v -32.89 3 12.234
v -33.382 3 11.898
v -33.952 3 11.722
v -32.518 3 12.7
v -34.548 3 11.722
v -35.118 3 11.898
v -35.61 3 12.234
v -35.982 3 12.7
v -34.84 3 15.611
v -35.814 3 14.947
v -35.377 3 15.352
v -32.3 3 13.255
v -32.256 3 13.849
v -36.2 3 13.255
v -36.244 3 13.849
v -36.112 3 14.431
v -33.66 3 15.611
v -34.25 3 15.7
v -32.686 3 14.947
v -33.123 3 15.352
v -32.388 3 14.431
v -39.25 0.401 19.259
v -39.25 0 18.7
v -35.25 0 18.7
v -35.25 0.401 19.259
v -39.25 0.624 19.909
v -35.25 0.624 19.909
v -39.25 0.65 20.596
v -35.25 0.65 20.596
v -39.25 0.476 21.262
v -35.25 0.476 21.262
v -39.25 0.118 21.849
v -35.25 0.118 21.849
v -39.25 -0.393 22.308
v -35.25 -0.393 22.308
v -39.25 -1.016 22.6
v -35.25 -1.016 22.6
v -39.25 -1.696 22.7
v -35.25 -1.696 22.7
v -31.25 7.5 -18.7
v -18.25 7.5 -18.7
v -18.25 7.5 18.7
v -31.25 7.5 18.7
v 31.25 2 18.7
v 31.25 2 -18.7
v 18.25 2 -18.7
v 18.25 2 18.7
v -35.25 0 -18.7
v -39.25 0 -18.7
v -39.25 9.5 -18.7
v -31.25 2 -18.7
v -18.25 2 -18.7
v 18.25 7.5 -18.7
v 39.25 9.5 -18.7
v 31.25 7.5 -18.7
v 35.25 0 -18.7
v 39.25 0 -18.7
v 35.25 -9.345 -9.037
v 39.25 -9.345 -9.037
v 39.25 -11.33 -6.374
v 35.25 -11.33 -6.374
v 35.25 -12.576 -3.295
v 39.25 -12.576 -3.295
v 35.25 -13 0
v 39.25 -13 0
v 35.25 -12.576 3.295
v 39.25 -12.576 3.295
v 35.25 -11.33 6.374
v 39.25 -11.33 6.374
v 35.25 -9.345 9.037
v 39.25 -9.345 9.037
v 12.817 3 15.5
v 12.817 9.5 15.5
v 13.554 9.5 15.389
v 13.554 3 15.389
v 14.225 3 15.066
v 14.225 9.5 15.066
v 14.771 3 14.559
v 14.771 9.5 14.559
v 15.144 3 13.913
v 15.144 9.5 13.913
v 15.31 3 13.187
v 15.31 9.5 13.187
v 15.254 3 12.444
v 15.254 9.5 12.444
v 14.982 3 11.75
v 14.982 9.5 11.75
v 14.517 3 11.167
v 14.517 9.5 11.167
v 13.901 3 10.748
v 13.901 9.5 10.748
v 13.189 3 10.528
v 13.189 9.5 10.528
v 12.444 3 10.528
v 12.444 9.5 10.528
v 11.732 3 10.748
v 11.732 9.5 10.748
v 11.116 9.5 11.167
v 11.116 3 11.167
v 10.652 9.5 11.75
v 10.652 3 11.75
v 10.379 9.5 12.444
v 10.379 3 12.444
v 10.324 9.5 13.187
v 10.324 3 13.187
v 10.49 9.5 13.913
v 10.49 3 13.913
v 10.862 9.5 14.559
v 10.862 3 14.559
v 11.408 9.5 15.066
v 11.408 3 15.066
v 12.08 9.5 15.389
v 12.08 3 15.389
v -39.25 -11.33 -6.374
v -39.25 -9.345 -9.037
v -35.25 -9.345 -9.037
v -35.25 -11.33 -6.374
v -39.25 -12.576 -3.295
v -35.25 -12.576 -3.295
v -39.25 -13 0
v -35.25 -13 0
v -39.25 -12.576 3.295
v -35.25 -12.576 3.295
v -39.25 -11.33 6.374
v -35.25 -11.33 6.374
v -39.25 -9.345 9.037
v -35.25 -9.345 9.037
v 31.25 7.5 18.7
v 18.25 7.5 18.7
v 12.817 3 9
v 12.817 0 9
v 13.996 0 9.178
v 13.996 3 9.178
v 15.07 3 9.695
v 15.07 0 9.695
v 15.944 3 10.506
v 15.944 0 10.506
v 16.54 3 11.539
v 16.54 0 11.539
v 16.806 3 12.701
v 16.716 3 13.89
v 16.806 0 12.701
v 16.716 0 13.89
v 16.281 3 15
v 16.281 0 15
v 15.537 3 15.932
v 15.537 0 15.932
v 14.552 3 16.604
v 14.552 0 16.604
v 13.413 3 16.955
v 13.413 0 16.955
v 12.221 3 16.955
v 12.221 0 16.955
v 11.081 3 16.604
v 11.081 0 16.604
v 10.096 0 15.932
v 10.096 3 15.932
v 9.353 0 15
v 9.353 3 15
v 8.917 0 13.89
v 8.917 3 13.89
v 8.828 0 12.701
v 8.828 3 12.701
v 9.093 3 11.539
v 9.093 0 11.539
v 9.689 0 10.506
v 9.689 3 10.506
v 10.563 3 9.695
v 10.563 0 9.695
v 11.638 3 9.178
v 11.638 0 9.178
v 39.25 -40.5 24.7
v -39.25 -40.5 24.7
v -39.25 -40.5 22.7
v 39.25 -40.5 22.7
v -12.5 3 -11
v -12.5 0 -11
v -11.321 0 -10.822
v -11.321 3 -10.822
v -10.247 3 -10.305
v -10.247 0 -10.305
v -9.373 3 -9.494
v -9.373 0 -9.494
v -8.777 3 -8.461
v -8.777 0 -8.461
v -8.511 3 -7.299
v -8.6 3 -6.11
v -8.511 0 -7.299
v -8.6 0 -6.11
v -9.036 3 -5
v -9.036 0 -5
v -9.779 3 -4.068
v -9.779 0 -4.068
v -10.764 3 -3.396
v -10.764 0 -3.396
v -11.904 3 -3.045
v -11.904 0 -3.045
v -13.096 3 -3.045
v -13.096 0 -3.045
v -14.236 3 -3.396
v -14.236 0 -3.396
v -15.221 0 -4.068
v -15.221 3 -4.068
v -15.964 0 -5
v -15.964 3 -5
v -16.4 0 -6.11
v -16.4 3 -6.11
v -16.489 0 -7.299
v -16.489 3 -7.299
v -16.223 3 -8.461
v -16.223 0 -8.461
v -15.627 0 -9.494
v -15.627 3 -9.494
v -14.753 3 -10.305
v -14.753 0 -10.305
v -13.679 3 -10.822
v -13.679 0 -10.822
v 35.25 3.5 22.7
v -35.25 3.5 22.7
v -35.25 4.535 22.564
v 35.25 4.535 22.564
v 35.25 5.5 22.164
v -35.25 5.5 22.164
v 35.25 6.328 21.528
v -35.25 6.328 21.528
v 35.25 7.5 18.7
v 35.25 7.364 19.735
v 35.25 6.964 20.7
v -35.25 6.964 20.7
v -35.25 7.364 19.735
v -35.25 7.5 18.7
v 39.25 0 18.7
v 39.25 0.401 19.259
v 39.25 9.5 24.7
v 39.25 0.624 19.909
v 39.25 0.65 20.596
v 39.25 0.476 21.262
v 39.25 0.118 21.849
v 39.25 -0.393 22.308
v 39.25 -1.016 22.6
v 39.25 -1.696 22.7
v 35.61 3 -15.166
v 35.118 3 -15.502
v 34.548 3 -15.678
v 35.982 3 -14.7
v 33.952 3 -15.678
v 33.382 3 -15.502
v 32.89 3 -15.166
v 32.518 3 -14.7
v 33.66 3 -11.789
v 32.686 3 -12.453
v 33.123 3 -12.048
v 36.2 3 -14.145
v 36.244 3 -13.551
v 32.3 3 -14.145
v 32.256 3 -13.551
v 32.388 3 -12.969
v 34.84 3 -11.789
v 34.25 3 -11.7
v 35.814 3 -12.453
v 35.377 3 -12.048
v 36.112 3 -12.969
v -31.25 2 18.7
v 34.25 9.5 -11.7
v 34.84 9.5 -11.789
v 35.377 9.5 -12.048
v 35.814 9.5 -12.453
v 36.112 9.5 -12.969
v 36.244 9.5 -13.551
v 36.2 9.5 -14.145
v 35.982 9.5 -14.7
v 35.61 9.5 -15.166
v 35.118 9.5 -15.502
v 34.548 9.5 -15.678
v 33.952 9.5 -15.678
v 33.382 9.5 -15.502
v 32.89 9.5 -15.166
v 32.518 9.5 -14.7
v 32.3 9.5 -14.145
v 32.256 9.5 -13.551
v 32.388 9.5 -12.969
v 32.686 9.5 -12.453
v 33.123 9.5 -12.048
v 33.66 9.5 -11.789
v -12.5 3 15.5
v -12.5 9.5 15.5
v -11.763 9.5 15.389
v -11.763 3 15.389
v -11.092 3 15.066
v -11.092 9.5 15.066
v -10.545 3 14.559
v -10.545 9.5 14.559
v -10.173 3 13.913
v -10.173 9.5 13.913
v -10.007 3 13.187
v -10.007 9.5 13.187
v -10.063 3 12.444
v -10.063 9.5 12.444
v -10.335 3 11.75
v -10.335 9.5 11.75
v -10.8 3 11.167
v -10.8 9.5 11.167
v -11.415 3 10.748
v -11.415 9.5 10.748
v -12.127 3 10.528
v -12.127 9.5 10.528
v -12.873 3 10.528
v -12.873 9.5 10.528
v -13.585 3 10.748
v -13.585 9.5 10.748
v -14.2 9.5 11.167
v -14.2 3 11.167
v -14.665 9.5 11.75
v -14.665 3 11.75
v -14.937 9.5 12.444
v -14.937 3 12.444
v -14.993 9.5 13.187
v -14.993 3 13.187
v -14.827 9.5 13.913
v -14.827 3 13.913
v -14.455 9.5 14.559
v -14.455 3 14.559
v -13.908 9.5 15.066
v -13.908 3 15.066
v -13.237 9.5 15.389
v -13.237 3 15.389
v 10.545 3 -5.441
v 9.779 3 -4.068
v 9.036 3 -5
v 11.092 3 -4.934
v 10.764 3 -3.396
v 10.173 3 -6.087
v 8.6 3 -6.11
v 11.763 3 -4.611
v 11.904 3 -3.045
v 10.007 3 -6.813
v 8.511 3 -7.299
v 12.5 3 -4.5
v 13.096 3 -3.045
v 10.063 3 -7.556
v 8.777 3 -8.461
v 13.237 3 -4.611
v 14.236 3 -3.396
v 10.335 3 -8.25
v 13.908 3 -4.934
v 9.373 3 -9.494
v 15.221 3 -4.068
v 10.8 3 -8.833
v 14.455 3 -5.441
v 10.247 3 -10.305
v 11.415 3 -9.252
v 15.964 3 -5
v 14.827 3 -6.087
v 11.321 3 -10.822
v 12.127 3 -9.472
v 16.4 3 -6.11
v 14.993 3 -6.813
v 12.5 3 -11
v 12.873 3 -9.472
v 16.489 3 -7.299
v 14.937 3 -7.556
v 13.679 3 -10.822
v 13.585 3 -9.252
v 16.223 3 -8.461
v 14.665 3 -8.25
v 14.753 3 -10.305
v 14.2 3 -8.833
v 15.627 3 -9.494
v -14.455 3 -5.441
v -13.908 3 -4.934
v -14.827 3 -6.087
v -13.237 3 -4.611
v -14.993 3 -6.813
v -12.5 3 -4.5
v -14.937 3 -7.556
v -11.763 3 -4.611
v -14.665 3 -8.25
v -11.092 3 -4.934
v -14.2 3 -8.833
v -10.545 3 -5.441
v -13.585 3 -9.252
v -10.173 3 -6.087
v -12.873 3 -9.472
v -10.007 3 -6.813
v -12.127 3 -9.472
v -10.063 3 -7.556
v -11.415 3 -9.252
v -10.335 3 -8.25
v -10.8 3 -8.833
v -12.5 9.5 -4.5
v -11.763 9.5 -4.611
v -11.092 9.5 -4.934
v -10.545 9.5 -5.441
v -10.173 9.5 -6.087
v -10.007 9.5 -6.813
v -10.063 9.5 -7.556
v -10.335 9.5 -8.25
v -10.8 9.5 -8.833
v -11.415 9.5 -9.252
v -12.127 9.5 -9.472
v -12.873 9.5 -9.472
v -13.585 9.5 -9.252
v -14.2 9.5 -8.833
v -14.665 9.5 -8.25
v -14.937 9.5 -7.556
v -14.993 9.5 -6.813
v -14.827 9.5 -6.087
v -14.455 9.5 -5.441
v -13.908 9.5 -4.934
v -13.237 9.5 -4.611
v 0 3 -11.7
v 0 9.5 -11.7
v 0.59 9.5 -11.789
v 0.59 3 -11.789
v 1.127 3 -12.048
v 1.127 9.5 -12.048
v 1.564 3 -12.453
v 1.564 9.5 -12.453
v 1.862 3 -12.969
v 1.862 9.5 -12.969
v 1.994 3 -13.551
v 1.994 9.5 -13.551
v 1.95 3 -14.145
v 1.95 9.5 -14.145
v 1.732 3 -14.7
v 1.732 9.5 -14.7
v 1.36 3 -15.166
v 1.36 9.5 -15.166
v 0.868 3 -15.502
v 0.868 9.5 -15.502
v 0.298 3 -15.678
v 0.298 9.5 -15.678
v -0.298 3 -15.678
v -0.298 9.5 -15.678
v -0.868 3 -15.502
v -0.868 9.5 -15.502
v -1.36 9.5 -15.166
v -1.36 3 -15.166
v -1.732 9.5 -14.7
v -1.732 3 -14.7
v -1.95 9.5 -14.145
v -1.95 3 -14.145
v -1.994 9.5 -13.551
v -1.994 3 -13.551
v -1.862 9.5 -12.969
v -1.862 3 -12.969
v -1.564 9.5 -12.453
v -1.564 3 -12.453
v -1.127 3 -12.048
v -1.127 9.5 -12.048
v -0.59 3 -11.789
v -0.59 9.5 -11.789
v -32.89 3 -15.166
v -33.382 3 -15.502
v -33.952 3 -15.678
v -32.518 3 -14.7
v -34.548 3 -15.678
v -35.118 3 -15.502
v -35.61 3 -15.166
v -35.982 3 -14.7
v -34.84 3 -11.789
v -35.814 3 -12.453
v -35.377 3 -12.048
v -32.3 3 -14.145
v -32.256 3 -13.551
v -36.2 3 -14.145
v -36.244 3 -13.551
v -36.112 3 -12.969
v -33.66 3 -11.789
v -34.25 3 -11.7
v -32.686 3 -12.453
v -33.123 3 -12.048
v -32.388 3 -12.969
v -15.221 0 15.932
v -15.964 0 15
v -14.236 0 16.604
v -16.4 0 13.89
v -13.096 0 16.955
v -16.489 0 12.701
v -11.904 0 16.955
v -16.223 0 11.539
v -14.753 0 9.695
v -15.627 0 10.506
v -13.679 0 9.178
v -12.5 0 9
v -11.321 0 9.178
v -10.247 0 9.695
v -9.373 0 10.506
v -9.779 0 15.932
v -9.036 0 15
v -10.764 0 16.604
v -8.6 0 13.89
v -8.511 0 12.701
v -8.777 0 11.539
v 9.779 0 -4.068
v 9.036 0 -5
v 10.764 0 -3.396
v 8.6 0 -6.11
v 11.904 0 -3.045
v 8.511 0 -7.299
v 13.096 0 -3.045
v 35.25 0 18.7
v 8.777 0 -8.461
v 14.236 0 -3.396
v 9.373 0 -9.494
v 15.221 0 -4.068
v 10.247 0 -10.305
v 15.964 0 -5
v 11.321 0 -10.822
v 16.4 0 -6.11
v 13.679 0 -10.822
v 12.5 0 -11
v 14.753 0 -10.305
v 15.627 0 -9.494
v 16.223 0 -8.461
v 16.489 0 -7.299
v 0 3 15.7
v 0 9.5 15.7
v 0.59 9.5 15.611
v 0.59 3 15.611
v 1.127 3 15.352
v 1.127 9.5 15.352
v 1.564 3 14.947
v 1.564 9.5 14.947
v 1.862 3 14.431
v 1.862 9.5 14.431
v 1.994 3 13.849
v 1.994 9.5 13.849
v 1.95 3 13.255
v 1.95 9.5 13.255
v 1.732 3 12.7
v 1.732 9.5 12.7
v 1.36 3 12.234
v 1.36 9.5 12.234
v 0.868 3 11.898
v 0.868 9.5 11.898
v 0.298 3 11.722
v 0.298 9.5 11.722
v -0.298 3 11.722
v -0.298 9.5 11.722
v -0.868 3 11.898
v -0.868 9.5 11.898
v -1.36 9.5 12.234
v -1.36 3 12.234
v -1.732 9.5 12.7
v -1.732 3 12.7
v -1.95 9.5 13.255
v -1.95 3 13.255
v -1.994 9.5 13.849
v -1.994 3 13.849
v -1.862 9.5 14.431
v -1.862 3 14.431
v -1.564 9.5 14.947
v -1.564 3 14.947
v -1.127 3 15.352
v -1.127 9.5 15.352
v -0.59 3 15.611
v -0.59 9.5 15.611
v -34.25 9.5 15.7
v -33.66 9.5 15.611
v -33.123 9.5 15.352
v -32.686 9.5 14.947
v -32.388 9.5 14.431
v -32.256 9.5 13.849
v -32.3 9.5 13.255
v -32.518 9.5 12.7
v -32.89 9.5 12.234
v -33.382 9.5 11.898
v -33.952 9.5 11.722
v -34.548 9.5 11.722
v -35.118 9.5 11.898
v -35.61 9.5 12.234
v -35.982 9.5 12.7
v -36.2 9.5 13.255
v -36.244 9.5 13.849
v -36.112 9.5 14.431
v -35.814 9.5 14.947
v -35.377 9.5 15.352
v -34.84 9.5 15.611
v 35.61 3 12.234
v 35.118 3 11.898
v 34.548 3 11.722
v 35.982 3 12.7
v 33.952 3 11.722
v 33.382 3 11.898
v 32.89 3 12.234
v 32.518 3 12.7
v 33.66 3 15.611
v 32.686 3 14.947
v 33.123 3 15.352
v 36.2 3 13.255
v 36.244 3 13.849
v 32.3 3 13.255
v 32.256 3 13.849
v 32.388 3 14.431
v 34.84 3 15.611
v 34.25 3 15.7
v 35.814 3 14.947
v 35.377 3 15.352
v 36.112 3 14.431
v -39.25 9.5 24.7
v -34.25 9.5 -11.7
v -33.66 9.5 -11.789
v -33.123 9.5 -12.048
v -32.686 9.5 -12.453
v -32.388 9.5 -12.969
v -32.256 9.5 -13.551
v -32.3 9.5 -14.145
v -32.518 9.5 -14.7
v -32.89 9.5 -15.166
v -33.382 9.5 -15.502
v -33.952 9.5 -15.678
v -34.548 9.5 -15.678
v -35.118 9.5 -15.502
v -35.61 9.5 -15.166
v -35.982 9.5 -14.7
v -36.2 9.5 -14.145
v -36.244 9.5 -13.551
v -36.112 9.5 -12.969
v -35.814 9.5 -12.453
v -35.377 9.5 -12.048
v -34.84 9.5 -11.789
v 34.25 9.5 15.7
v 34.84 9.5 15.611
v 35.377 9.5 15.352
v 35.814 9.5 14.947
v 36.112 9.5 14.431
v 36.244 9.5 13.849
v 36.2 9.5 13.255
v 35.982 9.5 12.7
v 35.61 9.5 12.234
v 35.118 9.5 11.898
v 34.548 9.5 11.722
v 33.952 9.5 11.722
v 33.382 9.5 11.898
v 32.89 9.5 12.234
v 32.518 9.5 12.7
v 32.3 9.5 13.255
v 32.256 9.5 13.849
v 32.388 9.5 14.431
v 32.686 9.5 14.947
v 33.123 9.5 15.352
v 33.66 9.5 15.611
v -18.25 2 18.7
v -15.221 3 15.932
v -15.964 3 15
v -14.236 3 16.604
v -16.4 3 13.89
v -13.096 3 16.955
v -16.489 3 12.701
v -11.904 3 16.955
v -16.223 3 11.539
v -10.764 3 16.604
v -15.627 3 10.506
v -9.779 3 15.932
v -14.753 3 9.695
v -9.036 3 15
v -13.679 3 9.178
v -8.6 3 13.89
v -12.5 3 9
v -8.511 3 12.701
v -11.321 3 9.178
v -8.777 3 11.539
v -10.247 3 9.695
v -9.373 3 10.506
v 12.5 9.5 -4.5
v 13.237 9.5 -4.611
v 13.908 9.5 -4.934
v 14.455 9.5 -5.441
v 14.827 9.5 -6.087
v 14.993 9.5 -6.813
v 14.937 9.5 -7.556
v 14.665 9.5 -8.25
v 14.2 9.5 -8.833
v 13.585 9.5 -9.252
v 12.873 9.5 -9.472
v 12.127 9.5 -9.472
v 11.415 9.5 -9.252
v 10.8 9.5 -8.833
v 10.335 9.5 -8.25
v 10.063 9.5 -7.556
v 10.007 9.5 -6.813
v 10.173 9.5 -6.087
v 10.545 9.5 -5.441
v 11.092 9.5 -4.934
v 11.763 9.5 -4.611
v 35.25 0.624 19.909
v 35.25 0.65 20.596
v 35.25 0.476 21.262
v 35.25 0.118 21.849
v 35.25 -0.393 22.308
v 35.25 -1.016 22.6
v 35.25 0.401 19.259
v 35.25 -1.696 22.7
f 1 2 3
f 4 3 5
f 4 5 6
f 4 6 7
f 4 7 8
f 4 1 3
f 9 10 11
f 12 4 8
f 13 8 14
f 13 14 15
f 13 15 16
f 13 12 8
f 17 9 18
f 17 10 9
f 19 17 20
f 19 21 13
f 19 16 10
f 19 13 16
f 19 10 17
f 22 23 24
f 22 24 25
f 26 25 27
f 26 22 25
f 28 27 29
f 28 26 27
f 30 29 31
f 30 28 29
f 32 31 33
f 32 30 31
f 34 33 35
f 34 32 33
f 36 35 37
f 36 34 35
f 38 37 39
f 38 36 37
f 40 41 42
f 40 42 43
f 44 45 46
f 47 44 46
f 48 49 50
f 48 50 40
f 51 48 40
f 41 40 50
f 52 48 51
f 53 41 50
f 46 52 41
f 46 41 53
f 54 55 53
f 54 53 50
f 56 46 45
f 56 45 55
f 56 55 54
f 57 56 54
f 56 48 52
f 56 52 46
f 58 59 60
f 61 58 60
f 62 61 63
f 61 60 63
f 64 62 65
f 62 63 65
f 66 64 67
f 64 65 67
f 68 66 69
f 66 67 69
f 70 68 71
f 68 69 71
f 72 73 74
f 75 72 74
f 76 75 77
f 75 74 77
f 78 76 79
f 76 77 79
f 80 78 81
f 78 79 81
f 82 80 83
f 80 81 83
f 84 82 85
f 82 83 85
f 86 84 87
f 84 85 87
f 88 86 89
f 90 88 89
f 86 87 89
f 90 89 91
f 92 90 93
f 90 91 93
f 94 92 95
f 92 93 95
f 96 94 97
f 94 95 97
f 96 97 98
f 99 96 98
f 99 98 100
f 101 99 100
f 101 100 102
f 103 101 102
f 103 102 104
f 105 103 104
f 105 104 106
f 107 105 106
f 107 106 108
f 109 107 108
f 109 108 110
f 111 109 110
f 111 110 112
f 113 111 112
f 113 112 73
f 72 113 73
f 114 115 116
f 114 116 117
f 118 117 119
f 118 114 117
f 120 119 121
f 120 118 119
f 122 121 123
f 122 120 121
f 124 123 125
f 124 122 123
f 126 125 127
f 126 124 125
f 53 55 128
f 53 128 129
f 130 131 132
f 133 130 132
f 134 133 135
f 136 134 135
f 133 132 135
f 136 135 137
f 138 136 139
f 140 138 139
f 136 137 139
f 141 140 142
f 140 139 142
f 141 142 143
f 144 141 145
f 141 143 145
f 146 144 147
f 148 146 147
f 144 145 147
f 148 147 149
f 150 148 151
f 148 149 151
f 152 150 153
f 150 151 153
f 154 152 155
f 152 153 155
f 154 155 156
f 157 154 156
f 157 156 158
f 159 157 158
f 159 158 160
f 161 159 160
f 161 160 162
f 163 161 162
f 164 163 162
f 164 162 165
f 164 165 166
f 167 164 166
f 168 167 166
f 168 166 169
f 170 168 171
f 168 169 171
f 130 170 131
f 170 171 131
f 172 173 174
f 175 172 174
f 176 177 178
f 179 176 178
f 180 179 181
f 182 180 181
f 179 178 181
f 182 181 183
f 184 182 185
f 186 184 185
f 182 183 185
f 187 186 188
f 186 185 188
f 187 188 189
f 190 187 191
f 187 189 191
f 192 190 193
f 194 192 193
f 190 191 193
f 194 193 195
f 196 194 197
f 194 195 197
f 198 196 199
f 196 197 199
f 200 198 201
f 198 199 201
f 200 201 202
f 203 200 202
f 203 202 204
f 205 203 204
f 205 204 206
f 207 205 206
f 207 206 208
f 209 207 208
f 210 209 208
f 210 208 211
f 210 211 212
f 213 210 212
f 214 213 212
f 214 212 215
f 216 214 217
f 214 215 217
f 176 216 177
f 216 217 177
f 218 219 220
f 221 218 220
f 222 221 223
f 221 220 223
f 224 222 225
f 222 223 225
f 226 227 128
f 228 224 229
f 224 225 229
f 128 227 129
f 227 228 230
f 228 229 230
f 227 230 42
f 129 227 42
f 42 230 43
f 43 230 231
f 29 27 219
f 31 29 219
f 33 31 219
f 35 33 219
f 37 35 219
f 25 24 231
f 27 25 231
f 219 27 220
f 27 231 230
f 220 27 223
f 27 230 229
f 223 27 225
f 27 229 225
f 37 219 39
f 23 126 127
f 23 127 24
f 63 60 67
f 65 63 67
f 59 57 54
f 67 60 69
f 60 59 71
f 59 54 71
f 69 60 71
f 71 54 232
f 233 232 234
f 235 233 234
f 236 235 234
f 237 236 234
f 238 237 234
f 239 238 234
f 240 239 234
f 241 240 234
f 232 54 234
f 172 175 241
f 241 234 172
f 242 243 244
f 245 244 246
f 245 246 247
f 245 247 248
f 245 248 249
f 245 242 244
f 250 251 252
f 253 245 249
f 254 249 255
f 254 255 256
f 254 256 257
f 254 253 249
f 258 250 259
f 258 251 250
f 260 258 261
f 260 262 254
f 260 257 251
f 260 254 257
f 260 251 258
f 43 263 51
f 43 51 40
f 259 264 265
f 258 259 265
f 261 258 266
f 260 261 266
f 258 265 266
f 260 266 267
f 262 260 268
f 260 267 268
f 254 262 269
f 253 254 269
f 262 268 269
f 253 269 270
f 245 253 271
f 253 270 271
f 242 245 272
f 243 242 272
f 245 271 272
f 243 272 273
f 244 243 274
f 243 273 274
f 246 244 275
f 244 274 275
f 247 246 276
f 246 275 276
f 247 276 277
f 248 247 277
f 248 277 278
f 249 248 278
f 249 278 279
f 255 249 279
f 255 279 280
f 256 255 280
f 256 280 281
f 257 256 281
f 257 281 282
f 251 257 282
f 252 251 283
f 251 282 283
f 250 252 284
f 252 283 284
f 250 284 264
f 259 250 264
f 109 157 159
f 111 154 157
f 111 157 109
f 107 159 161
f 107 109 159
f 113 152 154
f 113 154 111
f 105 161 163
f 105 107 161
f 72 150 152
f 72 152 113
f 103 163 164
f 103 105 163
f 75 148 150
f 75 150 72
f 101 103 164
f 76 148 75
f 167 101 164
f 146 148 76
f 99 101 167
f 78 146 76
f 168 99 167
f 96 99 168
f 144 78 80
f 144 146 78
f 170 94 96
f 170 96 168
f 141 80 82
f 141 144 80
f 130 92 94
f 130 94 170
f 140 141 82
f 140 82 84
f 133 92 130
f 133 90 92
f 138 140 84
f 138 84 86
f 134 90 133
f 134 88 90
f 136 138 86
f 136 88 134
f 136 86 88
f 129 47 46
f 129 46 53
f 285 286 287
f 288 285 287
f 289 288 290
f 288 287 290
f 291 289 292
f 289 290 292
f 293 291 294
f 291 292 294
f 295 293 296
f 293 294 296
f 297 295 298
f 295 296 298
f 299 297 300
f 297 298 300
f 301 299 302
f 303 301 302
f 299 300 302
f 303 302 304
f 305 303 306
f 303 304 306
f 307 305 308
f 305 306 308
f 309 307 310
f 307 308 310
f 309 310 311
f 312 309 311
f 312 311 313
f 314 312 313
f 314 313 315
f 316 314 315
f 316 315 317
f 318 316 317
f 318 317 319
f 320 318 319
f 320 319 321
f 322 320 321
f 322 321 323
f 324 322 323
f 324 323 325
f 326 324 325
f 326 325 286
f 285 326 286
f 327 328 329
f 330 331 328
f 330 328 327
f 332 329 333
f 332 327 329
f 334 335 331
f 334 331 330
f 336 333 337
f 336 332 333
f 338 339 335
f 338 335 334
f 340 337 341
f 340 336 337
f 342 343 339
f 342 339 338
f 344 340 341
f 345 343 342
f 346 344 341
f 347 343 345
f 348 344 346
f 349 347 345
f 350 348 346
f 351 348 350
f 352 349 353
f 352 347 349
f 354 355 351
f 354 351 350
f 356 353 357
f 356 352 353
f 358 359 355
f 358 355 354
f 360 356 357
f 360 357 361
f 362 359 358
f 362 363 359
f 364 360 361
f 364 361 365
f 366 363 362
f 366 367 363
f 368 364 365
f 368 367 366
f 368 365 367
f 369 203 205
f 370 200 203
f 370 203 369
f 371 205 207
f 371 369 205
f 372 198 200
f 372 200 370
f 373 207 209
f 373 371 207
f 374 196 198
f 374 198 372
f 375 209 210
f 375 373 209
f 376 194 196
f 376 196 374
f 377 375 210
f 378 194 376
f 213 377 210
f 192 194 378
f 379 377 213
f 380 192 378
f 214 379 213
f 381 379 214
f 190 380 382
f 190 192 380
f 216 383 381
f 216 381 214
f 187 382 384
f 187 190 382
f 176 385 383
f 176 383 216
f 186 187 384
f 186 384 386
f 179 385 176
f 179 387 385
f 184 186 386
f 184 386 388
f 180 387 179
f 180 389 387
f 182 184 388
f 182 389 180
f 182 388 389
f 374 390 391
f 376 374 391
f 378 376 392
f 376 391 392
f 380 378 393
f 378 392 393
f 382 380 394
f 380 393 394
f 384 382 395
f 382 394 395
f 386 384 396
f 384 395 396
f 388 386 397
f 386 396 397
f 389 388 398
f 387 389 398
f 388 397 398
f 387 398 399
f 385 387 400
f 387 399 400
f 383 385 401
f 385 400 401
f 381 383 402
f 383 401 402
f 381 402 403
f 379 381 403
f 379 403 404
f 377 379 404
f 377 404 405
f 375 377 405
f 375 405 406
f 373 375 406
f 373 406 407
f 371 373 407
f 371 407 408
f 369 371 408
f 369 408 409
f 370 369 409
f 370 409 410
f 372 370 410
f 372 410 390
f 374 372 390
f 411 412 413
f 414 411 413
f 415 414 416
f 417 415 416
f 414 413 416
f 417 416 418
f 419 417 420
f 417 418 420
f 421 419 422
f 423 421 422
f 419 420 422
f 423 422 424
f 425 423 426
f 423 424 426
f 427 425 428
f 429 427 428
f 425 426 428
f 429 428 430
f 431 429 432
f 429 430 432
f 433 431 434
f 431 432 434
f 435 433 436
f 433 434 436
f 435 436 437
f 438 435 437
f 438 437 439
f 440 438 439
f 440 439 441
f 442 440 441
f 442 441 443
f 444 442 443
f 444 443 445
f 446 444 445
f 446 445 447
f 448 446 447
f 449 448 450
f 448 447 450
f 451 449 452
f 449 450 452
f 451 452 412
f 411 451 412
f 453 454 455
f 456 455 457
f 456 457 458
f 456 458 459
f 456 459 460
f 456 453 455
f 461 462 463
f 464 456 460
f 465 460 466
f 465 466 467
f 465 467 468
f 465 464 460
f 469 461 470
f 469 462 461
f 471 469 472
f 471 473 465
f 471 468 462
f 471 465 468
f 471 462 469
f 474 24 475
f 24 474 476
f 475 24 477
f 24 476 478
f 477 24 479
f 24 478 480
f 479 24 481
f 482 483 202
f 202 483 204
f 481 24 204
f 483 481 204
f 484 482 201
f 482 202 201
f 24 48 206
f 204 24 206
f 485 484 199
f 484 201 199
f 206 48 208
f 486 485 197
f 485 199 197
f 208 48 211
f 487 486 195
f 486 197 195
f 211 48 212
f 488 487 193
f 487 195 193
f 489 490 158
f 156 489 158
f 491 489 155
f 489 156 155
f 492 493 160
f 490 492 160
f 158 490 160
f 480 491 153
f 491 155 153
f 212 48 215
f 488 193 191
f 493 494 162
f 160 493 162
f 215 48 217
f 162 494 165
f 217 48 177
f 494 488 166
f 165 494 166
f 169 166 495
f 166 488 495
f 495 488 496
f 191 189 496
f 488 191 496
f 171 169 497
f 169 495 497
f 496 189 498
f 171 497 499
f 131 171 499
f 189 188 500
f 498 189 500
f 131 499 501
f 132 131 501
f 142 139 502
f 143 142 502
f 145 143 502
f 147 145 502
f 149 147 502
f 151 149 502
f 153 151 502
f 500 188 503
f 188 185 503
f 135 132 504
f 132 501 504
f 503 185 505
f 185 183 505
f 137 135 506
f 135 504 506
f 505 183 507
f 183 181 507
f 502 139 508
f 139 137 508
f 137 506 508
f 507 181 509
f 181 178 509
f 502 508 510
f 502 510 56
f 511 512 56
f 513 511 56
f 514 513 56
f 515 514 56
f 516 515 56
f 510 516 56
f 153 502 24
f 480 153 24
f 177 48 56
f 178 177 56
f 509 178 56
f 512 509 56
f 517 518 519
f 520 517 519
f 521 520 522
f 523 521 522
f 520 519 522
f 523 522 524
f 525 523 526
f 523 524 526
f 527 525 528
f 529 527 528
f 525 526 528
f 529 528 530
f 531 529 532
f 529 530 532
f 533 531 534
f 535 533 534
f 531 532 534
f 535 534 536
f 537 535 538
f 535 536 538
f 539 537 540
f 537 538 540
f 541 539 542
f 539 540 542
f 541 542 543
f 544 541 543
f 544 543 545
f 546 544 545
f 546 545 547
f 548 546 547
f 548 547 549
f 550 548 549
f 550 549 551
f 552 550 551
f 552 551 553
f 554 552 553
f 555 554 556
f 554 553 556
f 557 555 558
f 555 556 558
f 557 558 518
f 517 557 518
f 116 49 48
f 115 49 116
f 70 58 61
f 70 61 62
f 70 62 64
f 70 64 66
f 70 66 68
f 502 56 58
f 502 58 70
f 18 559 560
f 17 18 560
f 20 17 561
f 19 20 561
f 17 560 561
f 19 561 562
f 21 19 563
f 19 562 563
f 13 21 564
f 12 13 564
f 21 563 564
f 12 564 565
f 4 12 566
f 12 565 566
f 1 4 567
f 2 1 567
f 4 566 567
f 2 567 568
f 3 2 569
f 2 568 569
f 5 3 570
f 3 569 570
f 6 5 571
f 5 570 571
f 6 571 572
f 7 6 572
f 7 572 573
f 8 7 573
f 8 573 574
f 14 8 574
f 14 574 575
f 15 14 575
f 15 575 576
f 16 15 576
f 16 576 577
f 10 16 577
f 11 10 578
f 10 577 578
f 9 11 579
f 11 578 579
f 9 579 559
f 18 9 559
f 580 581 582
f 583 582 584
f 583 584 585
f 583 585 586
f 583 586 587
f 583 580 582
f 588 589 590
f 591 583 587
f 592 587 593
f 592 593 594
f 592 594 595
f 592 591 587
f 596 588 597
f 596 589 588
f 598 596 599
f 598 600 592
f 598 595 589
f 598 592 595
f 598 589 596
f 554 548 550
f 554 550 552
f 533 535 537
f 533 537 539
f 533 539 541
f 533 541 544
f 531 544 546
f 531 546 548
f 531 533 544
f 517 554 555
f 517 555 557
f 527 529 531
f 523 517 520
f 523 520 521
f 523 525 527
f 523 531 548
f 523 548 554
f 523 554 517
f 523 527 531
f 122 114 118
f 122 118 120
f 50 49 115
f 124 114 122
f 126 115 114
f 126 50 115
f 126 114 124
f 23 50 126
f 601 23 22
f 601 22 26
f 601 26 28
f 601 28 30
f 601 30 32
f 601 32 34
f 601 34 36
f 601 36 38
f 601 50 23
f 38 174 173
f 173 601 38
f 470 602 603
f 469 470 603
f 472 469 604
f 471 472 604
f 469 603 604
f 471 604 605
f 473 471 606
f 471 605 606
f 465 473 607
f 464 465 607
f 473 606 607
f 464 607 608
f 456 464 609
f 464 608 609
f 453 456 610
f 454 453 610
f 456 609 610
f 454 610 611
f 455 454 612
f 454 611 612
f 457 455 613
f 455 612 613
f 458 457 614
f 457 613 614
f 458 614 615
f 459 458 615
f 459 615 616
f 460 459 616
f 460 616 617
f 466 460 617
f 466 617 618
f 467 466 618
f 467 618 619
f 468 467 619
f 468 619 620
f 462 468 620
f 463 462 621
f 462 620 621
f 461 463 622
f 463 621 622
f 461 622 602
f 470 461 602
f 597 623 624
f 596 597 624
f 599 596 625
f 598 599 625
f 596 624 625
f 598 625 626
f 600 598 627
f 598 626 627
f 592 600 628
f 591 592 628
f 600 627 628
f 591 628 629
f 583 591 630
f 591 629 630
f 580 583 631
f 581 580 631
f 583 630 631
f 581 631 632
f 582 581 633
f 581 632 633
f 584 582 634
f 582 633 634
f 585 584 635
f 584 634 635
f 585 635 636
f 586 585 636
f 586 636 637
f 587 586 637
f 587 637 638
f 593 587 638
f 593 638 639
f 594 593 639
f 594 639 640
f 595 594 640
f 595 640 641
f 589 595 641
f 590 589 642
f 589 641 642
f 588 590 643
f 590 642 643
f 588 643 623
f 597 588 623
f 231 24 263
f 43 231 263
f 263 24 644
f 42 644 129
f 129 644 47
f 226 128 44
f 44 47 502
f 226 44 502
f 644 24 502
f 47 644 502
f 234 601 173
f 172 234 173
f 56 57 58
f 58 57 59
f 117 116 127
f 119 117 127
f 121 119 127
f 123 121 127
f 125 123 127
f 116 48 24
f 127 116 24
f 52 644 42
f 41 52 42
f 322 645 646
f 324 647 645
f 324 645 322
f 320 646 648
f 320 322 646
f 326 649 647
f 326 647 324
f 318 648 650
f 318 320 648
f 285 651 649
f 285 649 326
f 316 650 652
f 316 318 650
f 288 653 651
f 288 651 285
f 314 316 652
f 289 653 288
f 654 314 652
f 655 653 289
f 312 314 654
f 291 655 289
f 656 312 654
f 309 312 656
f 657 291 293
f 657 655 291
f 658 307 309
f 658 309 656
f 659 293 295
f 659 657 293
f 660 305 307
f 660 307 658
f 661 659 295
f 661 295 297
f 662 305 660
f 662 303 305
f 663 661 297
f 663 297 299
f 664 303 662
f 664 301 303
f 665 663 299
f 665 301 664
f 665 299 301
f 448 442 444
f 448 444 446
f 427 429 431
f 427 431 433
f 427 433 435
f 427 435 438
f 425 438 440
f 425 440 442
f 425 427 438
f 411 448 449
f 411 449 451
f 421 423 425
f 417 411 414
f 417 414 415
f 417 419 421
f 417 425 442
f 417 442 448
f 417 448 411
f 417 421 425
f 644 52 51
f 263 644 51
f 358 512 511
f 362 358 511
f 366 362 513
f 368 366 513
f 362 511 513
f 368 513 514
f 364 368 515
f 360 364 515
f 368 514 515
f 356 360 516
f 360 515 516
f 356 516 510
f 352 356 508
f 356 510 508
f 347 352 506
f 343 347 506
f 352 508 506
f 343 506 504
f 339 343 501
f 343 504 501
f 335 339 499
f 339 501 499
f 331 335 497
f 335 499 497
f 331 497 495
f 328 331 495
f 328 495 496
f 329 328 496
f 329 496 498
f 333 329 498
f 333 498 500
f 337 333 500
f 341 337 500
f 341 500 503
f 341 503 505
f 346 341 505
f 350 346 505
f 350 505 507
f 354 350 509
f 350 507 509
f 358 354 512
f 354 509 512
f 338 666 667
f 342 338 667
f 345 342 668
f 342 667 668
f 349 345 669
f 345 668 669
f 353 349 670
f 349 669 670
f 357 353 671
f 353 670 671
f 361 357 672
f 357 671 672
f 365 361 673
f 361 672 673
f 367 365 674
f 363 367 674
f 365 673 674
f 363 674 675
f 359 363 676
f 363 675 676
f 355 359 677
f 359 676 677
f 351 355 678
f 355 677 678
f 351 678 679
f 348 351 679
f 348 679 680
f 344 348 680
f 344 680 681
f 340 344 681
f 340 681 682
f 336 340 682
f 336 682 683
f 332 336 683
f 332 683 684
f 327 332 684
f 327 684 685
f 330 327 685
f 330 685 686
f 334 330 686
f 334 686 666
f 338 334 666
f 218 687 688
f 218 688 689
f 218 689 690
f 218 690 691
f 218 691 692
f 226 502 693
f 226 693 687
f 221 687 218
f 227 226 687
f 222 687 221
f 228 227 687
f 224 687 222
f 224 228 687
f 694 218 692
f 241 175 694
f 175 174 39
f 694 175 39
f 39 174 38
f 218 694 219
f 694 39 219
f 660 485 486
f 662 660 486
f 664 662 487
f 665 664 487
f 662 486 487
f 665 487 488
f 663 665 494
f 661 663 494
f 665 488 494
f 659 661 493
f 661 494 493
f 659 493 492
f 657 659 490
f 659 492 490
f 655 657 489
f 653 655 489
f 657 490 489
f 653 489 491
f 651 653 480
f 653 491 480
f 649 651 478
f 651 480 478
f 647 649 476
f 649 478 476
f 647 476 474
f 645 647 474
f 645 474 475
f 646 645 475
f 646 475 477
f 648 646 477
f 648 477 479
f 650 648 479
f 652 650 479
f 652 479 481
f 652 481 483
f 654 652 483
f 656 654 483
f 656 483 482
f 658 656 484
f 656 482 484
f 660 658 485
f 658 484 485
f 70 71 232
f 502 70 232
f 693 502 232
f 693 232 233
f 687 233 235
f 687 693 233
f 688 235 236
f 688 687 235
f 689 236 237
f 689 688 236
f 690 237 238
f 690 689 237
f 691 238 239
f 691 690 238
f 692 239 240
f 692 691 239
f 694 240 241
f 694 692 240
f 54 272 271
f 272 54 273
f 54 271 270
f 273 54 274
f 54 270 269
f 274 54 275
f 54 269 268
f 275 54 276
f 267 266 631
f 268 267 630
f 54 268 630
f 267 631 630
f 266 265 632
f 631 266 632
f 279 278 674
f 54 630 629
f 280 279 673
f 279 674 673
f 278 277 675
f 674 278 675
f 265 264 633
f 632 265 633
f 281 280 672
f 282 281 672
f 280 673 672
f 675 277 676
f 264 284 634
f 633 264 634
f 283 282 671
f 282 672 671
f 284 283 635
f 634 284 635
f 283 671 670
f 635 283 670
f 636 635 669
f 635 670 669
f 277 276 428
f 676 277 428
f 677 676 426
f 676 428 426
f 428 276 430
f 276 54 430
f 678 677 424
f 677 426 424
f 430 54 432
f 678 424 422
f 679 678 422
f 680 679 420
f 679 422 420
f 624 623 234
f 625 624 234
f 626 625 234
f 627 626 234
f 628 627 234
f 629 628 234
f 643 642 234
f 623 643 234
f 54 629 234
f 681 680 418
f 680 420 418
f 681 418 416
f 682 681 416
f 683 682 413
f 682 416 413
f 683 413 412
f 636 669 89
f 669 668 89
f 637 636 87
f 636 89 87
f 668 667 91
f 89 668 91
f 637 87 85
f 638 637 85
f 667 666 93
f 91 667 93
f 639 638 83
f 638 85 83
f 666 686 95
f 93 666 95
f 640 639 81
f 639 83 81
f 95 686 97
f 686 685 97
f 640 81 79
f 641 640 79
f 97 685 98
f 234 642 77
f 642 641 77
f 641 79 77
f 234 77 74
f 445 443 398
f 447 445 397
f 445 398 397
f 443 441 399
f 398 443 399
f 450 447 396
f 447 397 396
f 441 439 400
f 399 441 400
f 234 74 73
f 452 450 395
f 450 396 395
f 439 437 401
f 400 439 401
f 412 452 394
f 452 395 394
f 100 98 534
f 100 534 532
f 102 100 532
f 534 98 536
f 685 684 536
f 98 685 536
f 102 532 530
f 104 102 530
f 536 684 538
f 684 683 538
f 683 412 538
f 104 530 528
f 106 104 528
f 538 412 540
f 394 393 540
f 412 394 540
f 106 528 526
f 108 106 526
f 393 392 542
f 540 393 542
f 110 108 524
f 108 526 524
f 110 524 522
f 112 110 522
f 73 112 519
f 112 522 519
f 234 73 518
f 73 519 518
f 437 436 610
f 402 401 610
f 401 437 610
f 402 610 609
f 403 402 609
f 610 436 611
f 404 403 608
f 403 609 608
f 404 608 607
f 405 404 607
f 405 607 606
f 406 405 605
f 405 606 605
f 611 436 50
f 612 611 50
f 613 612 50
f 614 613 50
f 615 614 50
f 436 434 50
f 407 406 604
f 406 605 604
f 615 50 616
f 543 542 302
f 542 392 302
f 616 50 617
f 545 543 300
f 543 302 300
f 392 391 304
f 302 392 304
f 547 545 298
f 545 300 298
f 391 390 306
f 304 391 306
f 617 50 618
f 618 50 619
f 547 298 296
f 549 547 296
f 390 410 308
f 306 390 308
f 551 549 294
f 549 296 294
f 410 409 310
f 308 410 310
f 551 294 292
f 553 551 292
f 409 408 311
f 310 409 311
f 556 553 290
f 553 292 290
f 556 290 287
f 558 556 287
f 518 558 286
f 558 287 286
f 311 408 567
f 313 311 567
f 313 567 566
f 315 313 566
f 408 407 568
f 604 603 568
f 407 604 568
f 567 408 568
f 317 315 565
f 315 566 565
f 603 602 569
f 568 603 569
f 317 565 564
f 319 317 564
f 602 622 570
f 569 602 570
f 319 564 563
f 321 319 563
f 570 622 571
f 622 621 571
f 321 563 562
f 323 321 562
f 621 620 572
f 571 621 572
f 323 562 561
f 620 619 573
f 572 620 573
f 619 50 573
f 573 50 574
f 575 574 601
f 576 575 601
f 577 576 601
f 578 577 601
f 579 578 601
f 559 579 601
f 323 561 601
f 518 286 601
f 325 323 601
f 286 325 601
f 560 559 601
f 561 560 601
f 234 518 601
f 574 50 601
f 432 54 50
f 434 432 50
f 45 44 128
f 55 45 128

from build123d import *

# Parameters (mm, degrees)
SKETCH1_W           = 78.5
SKETCH1_H           = 37.4
BOSS_EXTRUDE1_DEPTH = 9.5
SKETCH6_R           = 2
CUT_EXTRUDE1_DEPTH  = 6.5
BOSS_EXTRUDE2_DEPTH = 4
SKETCH9_W           = 13
SKETCH9_H           = 5.5
CUT_EXTRUDE3_DEPTH  = 56.75233179
BOSS_EXTRUDE3_REACH = 83.737
BOSS_EXTRUDE4_START = -4
BOSS_EXTRUDE4_DEPTH = 4
BOSS_EXTRUDE5_DEPTH = 4
SKETCH15_R          = 2.5
CUT_EXTRUDE4_DEPTH  = 15
SKETCH16_R          = 4
CUT_EXTRUDE5_DEPTH  = 3


with BuildPart() as part:
    # Sketch1 → Boss-Extrude1 (new body)
    with BuildSketch(Plane(origin=(0, 0, 0), x_dir=(1, 0, 0), z_dir=(0, 1, 0))):
        Rectangle(SKETCH1_W, SKETCH1_H)
    extrude(amount=BOSS_EXTRUDE1_DEPTH)

    # Sketch6 → Cut-Extrude1 (cut)
    with BuildSketch(Plane(origin=(0, 9.5, 0), x_dir=(1, 0, 0), z_dir=(0, 1, 0))):
        with Locations(Location((-34.25, 13.7, 0), (0, 0, 270))):
            Circle(SKETCH6_R)
        with Locations(Location((0, 13.7, 0), (0, 0, 270))):
            Circle(SKETCH6_R)
        with Locations(Location((34.25, 13.7, 0), (0, 0, 270))):
            Circle(SKETCH6_R)
        with Locations(Location((34.25, -13.7, 0), (0, 0, 270))):
            Circle(SKETCH6_R)
        with Locations(Location((0, -13.7, 0), (0, 0, 270))):
            Circle(SKETCH6_R)
        with Locations(Location((-34.25, -13.7, 0), (0, 0, 270))):
            Circle(SKETCH6_R)
    extrude(amount=-CUT_EXTRUDE1_DEPTH, mode=Mode.SUBTRACT)

    # Sketch7 → Boss-Extrude2 (add)
    with BuildSketch(Plane.ZY.offset(39.25)):
        with BuildLine():
            Line((-18.7, 0), (-9.037433155, -9.344774046))
            ThreePointArc((-9.037433155, -9.344774046), (0, -13), (9.037433155, -9.344774046))
            Line((9.037433155, -9.344774046), (18.7, 0))
            Line((18.7, 0), (-18.7, 0))
        make_face()
    boss_extrude2 = extrude(amount=-BOSS_EXTRUDE2_DEPTH)

    # Mirror1: Boss-Extrude2 across plane
    add(boss_extrude2.mirror(Plane(origin=(0, 0, 0), x_dir=(0, 0, 1), z_dir=(1, 0, 0))))

    # Sketch9 → Cut-Extrude3 (cut, through all)
    with BuildSketch(Plane(origin=(0, 0, -18.7), x_dir=(-1, 0, 0), z_dir=(0, 0, -1))):
        with Locations((24.75, 4.75)):
            Rectangle(SKETCH9_W, SKETCH9_H)
        with Locations((-24.75, 4.75)):
            Rectangle(SKETCH9_W, SKETCH9_H)
    extrude(amount=-CUT_EXTRUDE3_DEPTH, mode=Mode.SUBTRACT)

    # Boss-Extrude3: up to this face of the body (flat: up to its plane)
    boss_extrude3_end = Plane(part.part.faces().sort_by_distance((39.25, 0.189608499, 0))[0])
    # Sketch11 → Boss-Extrude3 (add, up to the picked face)
    with BuildSketch(Plane.ZY.offset(39.25), mode=Mode.PRIVATE) as boss_extrude3_sk1:
        with BuildLine():
            Line((18.7, 9.5), (24.7, 9.5))
            Line((24.7, 9.5), (24.7, -40.5))
            Line((24.7, -40.5), (22.7, -40.5))
            Line((22.7, -40.5), (22.7, 3.5))
            ThreePointArc((22.7, 3.5), (21.528427125, 6.328427125), (18.7, 7.5))
            Line((18.7, 7.5), (18.7, 9.5))
        make_face()
    boss_extrude3_tool1 = split(extrude(boss_extrude3_sk1.sketch, amount=-BOSS_EXTRUDE3_REACH, mode=Mode.PRIVATE), bisect_by=boss_extrude3_end, keep=Keep.BOTH, mode=Mode.PRIVATE)
    add(boss_extrude3_tool1.solids().sort_by(Axis((-39.25, -13.095828, 23.426281), (1, 0, 0)))[0])

    # Sketch12 → Boss-Extrude4 (add)
    with BuildSketch(Plane(origin=(39.25, 0, 0), x_dir=(0, 0, -1), z_dir=(1, 0, 0)).offset(BOSS_EXTRUDE4_START)):
        with BuildLine():
            Line((-18.7, 7.5), (-18.7, 0))
            ThreePointArc((-18.7, 0), (-21.261557408, 0.476218058), (-22.7, -1.696163792))
            Line((-22.7, -1.696163792), (-22.7, 3.5))
            ThreePointArc((-22.7, 3.5), (-21.528427125, 6.328427125), (-18.7, 7.5))
        make_face()
    extrude(amount=BOSS_EXTRUDE4_DEPTH)

    # Sketch13 → Boss-Extrude5 (add)
    with BuildSketch(Plane.ZY.offset(39.25)):
        with BuildLine():
            Line((22.7, -1.696163792), (22.7, 3.5))
            ThreePointArc((22.7, 3.5), (21.528427125, 6.328427125), (18.7, 7.5))
            Line((18.7, 7.5), (18.7, 0))
            ThreePointArc((18.7, 0), (21.261557408, 0.476218058), (22.7, -1.696163792))
        make_face()
    extrude(amount=-BOSS_EXTRUDE5_DEPTH)

    # Sketch15 → Cut-Extrude4 (cut)
    with BuildSketch(Plane(origin=(0, 9.5, 0), x_dir=(1, 0, 0), z_dir=(0, 1, 0))):
        with Locations(Location((-12.5, 7, 0), (0, 0, 270))):
            Circle(SKETCH15_R)
        with Locations(Location((-12.5, -13, 0), (0, 0, 270))):
            Circle(SKETCH15_R)
        with Locations(Location((12.816690271, -13, 0), (0, 0, 270))):
            Circle(SKETCH15_R)
        with Locations(Location((12.5, 7, 0), (0, 0, 270))):
            Circle(SKETCH15_R)
    extrude(amount=-CUT_EXTRUDE4_DEPTH, mode=Mode.SUBTRACT)

    # Sketch16 → Cut-Extrude5 (cut)
    with BuildSketch(Plane.XZ):
        with Locations(Location((-12.5, 13, 0), (0, 0, 270))):
            Circle(SKETCH16_R)
        with Locations(Location((12.816690271, 13, 0), (0, 0, 270))):
            Circle(SKETCH16_R)
        with Locations(Location((12.5, -7, 0), (0, 0, 270))):
            Circle(SKETCH16_R)
        with Locations(Location((-12.5, -7, 0), (0, 0, 270))):
            Circle(SKETCH16_R)
    extrude(amount=-CUT_EXTRUDE5_DEPTH, mode=Mode.SUBTRACT)


solid = part.part
